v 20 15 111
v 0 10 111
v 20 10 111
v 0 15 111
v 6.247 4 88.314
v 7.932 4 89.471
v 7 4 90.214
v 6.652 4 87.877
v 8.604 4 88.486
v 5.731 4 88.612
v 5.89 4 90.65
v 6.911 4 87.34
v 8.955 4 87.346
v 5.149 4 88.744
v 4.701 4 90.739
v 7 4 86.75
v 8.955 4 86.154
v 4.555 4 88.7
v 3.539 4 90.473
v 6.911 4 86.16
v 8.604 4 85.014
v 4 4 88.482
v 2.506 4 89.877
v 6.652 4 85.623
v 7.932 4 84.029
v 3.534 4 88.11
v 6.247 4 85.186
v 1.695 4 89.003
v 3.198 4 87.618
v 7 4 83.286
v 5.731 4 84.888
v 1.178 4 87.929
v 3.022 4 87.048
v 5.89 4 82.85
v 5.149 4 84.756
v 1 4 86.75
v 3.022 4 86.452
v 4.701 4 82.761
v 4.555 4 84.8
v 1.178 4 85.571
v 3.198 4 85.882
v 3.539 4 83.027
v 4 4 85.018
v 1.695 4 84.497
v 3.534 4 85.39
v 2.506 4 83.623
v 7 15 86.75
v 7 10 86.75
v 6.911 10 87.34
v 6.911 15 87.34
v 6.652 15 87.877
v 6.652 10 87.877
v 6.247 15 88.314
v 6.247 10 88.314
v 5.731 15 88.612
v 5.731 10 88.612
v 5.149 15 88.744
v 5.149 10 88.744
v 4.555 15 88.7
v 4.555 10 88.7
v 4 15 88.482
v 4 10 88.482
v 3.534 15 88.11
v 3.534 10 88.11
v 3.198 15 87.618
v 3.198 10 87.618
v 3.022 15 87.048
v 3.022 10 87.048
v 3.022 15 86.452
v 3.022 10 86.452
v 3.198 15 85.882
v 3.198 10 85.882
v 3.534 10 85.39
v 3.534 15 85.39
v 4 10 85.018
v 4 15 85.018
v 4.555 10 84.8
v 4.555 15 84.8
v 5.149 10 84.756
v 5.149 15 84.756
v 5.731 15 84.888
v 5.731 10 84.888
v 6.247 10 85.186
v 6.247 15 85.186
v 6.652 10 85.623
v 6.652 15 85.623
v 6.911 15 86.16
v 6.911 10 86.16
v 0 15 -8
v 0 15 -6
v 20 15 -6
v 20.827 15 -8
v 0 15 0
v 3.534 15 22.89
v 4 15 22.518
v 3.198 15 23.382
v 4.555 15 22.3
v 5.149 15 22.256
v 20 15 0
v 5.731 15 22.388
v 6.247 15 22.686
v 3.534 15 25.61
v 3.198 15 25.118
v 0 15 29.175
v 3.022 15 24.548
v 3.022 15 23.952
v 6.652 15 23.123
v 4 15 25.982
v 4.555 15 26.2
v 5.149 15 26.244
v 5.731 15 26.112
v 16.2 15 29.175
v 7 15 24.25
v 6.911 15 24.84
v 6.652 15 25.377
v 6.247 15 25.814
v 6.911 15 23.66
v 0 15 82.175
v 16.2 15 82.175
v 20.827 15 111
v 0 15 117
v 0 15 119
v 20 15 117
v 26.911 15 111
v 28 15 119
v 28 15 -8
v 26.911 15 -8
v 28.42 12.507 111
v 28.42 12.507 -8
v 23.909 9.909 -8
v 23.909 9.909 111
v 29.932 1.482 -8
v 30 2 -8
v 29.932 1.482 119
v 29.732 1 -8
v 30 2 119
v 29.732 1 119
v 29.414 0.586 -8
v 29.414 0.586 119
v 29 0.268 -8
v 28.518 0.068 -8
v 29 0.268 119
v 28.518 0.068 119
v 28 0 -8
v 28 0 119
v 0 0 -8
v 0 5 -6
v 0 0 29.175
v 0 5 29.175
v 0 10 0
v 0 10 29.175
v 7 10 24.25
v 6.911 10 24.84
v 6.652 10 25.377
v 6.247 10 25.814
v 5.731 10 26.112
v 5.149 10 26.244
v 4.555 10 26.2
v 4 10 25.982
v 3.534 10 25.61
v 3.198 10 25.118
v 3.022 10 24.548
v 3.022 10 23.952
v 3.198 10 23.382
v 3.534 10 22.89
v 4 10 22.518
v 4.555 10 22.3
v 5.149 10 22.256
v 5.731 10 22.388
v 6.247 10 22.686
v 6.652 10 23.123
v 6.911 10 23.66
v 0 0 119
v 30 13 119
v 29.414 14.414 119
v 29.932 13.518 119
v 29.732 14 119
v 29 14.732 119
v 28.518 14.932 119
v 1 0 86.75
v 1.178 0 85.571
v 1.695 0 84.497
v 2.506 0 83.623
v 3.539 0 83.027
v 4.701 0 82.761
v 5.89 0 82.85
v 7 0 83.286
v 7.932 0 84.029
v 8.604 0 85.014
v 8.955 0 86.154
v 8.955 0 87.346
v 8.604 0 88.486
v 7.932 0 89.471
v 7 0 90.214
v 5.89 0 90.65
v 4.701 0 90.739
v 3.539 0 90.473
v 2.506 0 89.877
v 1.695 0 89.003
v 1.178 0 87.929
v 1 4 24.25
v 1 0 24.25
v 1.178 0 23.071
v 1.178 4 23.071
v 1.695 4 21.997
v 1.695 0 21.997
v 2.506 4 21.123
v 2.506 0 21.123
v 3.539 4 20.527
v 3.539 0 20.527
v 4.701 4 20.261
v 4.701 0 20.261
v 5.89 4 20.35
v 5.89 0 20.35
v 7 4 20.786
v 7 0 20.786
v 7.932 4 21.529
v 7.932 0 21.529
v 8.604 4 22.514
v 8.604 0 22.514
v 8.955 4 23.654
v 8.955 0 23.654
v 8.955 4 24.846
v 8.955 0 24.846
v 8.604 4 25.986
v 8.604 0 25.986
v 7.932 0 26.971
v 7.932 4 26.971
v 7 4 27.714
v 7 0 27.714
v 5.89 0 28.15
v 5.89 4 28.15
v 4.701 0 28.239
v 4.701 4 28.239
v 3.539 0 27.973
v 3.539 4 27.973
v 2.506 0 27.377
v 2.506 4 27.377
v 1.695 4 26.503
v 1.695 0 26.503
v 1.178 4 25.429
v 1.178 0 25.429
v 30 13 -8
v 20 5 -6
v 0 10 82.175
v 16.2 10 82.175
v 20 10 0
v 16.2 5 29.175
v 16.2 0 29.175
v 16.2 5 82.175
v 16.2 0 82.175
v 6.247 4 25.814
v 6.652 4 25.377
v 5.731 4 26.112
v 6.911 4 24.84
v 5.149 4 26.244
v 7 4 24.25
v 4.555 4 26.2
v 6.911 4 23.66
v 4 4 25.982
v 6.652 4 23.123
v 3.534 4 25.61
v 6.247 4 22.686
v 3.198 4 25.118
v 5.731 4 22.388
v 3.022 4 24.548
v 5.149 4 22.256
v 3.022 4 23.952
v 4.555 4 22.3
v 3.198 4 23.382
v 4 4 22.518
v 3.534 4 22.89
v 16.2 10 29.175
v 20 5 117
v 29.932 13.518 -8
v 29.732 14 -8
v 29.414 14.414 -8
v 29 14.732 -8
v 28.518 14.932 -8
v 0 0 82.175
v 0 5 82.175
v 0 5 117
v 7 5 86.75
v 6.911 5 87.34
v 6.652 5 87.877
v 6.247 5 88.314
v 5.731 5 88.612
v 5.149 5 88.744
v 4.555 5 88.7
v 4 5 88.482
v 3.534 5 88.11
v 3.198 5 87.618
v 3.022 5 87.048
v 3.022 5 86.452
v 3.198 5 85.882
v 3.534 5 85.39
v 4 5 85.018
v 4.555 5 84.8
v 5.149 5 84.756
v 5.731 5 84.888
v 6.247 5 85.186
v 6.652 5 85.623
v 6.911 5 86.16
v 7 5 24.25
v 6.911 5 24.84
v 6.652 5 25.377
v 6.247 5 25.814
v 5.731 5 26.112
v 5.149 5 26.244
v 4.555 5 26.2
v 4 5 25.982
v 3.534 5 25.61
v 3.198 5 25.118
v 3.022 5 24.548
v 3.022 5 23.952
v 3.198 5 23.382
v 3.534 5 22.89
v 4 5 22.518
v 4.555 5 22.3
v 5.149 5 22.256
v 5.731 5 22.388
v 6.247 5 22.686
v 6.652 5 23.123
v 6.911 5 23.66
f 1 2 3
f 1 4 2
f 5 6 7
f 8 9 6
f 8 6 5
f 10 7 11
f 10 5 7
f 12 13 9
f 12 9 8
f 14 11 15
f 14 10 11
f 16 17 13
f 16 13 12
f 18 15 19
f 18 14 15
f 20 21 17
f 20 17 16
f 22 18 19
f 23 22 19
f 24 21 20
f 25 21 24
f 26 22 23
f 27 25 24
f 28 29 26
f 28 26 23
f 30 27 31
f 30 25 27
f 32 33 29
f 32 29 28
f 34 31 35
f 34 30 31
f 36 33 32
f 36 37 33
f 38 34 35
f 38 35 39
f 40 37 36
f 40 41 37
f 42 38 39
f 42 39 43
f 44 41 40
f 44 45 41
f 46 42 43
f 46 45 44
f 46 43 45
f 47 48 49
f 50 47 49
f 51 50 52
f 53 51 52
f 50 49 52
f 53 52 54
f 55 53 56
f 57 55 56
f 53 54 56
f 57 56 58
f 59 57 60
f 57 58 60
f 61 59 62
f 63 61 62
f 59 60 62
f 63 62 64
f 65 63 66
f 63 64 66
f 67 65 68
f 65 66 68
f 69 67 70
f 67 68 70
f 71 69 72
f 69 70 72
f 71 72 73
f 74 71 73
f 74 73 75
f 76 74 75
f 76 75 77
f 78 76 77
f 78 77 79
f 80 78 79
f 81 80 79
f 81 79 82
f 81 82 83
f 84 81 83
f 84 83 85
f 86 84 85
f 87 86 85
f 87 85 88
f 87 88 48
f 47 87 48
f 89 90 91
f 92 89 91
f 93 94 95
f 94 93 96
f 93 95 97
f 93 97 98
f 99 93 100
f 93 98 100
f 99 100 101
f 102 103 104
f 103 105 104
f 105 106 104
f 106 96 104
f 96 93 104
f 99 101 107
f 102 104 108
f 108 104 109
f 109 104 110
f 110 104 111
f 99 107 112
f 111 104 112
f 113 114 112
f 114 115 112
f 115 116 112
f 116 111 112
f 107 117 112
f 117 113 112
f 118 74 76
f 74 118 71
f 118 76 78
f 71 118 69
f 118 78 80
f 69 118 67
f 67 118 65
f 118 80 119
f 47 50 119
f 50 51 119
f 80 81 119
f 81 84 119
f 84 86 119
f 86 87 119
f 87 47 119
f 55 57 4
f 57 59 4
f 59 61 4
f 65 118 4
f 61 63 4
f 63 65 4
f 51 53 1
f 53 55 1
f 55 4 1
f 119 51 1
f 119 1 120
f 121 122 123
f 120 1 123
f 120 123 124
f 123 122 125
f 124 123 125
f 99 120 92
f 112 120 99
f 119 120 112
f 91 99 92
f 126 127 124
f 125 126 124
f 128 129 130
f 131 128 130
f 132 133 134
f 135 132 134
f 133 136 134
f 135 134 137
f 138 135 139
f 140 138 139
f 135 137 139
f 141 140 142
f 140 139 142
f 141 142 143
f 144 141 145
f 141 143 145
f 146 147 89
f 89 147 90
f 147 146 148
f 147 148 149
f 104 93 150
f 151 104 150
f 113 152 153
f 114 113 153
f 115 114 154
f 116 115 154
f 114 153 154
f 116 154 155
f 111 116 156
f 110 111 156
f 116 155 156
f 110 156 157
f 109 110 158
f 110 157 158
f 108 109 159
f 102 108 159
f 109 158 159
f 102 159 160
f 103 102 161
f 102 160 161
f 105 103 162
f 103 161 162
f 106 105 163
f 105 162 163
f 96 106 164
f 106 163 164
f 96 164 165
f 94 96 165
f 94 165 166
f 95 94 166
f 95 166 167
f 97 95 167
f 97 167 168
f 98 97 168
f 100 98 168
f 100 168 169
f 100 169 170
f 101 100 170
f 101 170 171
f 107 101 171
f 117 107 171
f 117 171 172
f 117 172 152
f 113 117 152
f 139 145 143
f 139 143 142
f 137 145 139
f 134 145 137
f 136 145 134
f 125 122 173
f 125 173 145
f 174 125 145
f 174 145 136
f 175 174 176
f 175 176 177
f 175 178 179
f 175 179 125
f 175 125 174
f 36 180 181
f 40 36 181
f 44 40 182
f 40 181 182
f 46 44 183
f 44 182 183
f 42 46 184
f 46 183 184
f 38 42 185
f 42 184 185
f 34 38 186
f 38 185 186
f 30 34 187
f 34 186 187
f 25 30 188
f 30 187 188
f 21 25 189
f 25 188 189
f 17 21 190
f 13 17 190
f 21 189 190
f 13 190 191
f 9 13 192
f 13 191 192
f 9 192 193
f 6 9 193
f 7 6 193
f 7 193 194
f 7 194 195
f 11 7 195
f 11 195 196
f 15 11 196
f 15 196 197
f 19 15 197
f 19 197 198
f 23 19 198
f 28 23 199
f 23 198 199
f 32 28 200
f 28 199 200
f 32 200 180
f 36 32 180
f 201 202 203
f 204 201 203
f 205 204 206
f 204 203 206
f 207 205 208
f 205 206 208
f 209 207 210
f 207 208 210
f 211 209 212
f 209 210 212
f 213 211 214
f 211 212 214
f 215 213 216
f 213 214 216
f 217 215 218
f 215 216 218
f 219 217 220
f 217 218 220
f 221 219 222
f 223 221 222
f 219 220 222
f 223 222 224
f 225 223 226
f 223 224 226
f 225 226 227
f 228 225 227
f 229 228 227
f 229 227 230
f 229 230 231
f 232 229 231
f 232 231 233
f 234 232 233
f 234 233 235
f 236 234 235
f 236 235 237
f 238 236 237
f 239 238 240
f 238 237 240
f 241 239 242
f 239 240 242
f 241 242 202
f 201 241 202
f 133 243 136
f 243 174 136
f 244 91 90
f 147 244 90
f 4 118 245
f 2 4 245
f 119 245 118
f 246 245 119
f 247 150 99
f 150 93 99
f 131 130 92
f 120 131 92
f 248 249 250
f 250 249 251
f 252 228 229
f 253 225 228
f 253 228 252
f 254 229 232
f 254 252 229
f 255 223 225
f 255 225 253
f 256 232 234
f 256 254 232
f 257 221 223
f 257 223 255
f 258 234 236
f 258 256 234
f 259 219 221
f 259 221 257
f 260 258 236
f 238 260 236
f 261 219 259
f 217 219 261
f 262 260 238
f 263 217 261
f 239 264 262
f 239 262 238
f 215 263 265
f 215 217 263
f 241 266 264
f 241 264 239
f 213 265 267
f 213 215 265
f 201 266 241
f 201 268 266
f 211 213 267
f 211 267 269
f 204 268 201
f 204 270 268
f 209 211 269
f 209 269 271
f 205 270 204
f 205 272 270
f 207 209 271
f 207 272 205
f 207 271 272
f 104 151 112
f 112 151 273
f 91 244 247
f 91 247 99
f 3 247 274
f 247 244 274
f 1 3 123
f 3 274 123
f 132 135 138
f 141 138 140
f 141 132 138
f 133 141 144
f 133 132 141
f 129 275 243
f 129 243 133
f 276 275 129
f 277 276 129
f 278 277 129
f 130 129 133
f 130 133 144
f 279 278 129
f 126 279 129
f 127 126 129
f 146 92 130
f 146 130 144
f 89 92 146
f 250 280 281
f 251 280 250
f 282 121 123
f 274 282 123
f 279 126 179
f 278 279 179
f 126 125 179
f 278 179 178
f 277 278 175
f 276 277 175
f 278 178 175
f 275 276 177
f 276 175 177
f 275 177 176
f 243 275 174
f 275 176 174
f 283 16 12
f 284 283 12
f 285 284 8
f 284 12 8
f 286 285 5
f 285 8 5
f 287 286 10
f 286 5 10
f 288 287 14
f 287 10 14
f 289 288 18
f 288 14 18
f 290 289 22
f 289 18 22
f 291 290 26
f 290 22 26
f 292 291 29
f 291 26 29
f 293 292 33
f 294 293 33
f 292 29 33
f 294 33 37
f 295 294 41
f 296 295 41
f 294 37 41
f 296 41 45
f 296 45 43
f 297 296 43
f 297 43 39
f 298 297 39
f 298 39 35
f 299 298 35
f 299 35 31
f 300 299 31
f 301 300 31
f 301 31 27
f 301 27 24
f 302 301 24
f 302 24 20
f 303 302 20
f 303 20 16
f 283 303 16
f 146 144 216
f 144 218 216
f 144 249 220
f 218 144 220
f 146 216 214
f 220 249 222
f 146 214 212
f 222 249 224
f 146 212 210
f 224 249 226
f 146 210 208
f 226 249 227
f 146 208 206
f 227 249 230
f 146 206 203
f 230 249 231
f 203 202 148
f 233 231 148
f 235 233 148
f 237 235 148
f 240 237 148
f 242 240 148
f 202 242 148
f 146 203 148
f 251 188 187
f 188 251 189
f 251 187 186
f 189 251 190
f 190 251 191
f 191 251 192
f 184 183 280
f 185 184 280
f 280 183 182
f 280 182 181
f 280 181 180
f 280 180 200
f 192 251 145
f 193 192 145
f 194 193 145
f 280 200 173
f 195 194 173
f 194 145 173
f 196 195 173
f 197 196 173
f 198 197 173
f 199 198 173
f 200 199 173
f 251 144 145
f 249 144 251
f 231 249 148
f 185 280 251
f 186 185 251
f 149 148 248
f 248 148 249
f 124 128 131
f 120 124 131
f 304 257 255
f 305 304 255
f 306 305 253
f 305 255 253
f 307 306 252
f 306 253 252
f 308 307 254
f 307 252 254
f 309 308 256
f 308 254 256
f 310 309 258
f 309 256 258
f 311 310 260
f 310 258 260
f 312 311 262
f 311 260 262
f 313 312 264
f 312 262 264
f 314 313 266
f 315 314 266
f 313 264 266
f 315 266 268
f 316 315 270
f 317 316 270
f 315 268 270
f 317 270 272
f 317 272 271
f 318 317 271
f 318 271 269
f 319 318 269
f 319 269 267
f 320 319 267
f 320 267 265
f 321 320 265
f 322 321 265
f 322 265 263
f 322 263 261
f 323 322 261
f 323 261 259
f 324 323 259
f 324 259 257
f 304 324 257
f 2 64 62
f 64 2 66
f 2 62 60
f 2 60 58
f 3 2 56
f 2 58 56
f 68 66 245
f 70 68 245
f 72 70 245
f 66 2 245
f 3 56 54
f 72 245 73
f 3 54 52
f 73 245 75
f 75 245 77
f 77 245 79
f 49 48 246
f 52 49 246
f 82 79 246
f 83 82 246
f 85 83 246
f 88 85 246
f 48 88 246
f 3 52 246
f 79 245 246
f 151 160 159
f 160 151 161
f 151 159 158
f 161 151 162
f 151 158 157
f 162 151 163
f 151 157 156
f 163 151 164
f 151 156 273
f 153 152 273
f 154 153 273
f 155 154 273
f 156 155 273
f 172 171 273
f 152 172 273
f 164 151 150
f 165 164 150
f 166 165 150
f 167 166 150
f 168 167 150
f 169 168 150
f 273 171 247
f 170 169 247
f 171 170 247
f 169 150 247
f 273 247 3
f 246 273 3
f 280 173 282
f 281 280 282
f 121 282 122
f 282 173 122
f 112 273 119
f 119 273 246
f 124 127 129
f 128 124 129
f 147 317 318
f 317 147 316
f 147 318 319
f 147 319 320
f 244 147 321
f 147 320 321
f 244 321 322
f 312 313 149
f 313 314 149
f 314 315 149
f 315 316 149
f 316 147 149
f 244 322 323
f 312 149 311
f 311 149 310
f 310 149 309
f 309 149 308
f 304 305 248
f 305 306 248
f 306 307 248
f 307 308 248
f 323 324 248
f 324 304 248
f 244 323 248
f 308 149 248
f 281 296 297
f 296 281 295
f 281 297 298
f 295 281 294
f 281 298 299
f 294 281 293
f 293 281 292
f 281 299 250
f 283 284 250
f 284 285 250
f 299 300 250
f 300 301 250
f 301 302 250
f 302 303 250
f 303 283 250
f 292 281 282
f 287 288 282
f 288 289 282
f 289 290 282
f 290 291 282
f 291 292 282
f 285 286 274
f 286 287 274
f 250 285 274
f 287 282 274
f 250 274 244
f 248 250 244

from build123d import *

# Parameters (mm, degrees)
SALIENTE_EXTRUIR1_DEPTH = 111
SALIENTE_EXTRUIR2_DEPTH = 6
CROQUIS3_W              = 20
CROQUIS3_H              = 5
SALIENTE_EXTRUIR3_DEPTH = 2
SALIENTE_EXTRUIR4_DEPTH = 6
SALIENTE_EXTRUIR5_DEPTH = 2
CROQUIS6_R              = 2
CORTAR_EXTRUIR1_DEPTH   = 41
CROQUIS7_R              = 4
CORTAR_EXTRUIR2_DEPTH   = 4
CROQUIS9_W              = 16.2
CROQUIS9_H              = 53
CORTAR_EXTRUIR4_DEPTH   = 20
CORTAR_EXTRUIR5_DEPTH   = 119


with BuildPart() as part:
    # Croquis1 → Saliente-Extruir1 (new body)
    with BuildSketch(Plane.XY):
        with BuildLine():
            Line((0, 5), (0, 0))
            Line((0, 0), (28, 0))
            ThreePointArc((28, 0), (29.414213562, 0.585786438), (30, 2))
            Line((30, 2), (30, 13))
            ThreePointArc((30, 13), (29.414213562, 14.414213562), (28, 15))
            Line((28, 15), (0, 15))
            Line((0, 15), (0, 10))
            Line((0, 10), (20, 10))
            Line((20, 10), (20, 5))
            Line((20, 5), (0, 5))
        make_face()
    extrude(amount=SALIENTE_EXTRUIR1_DEPTH)

    # Croquis2 → Saliente-Extruir2 (add)
    with BuildSketch(Plane.XY.offset(111)):
        with BuildLine():
            Line((20, 15), (20, 10))
            Line((20, 10), (20, 5))
            Line((20, 5), (0, 5))
            Line((0, 5), (0, 0))
            Line((0, 0), (28, 0))
            ThreePointArc((28, 0), (29.414213562, 0.585786438), (30, 2))
            Line((30, 2), (30, 13))
            ThreePointArc((30, 13), (29.414213562, 14.414213562), (28, 15))
            Line((28, 15), (20, 15))
        make_face()
    extrude(amount=SALIENTE_EXTRUIR2_DEPTH)

    # Croquis3 → Saliente-Extruir3 (add)
    with BuildSketch(Plane.XY.offset(117)):
        Polygon((20, 10), (20, 15), (11, 15), (0, 15), (0, 10), align=None)
        with BuildLine():
            Line((28, 15), (20, 15))
            Line((20, 15), (20, 10))
            Line((20, 10), (20, 5))
            Line((20, 5), (0, 5))
            Line((0, 5), (0, 0))
            Line((0, 0), (28, 0))
            ThreePointArc((28, 0), (29.414213562, 0.585786438), (30, 2))
            Line((30, 2), (30, 13))
            ThreePointArc((30, 13), (29.414213562, 14.414213562), (28, 15))
        make_face()
        with Locations((10, 7.5)):
            Rectangle(CROQUIS3_W, CROQUIS3_H)
    extrude(amount=SALIENTE_EXTRUIR3_DEPTH)

    # Croquis4 → Saliente-Extruir4 (add)
    with BuildSketch(Plane(origin=(0, 0, 0), x_dir=(-1, 0, 0), z_dir=(0, 0, -1))):
        with BuildLine():
            Line((-20, 5), (-20, 10))
            Line((-20, 10), (-20, 15))
            Line((-20, 15), (-28, 15))
            ThreePointArc((-28, 15), (-29.414213562, 14.414213562), (-30, 13))
            Line((-30, 13), (-30, 2))
            ThreePointArc((-30, 2), (-29.414213562, 0.585786438), (-28, 0))
            Line((-28, 0), (0, 0))
            Line((0, 0), (0, 5))
            Line((0, 5), (-20, 5))
        make_face()
    extrude(amount=SALIENTE_EXTRUIR4_DEPTH)

    # Croquis5 → Saliente-Extruir5 (add)
    with BuildSketch(Plane(origin=(0, 0, -6), x_dir=(-1, 0, 0), z_dir=(0, 0, -1))):
        with BuildLine():
            Line((0, 15), (-28, 15))
            ThreePointArc((-28, 15), (-29.414213562, 14.414213562), (-30, 13))
            Line((-30, 13), (-30, 2))
            ThreePointArc((-30, 2), (-29.414213562, 0.585786438), (-28, 0))
            Line((-28, 0), (0, 0))
            Line((0, 0), (0, 15))
        make_face()
    extrude(amount=SALIENTE_EXTRUIR5_DEPTH)

    # Croquis6 → Cortar-Extruir1 (cut)
    with BuildSketch(Plane.XZ):
        with Locations((5, 24.25)):
            Circle(CROQUIS6_R)
        with Locations((5, 86.75)):
            Circle(CROQUIS6_R)
    extrude(amount=-CORTAR_EXTRUIR1_DEPTH, mode=Mode.SUBTRACT)

    # Croquis7 → Cortar-Extruir2 (cut)
    with BuildSketch(Plane(origin=(0, 0, 0), x_dir=(-1, 0, 0), z_dir=(0, -1, 0))):
        with Locations((-5, -24.25)):
            Circle(CROQUIS7_R)
        with Locations((-5, -86.75)):
            Circle(CROQUIS7_R)
    extrude(amount=-CORTAR_EXTRUIR2_DEPTH, mode=Mode.SUBTRACT)

    # Croquis9 → Cortar-Extruir4 (cut)
    with BuildSketch(Plane.XZ):
        with Locations((8.1, 55.674909876)):
            Rectangle(CROQUIS9_W, CROQUIS9_H)
    extrude(amount=-CORTAR_EXTRUIR4_DEPTH, mode=Mode.SUBTRACT)

    # Croquis10 → Cortar-Extruir5 (cut)
    with BuildSketch(Plane(origin=(0, 0, -8), x_dir=(-1, 0, 0), z_dir=(0, 0, -1))):
        Polygon((-26.910638664, 15), (-28.420130104, 12.506734448), (-23.909345161, 9.909393396), (-20.827352116, 15), align=None)
    extrude(amount=-CORTAR_EXTRUIR5_DEPTH, mode=Mode.SUBTRACT)


solid = part.part
